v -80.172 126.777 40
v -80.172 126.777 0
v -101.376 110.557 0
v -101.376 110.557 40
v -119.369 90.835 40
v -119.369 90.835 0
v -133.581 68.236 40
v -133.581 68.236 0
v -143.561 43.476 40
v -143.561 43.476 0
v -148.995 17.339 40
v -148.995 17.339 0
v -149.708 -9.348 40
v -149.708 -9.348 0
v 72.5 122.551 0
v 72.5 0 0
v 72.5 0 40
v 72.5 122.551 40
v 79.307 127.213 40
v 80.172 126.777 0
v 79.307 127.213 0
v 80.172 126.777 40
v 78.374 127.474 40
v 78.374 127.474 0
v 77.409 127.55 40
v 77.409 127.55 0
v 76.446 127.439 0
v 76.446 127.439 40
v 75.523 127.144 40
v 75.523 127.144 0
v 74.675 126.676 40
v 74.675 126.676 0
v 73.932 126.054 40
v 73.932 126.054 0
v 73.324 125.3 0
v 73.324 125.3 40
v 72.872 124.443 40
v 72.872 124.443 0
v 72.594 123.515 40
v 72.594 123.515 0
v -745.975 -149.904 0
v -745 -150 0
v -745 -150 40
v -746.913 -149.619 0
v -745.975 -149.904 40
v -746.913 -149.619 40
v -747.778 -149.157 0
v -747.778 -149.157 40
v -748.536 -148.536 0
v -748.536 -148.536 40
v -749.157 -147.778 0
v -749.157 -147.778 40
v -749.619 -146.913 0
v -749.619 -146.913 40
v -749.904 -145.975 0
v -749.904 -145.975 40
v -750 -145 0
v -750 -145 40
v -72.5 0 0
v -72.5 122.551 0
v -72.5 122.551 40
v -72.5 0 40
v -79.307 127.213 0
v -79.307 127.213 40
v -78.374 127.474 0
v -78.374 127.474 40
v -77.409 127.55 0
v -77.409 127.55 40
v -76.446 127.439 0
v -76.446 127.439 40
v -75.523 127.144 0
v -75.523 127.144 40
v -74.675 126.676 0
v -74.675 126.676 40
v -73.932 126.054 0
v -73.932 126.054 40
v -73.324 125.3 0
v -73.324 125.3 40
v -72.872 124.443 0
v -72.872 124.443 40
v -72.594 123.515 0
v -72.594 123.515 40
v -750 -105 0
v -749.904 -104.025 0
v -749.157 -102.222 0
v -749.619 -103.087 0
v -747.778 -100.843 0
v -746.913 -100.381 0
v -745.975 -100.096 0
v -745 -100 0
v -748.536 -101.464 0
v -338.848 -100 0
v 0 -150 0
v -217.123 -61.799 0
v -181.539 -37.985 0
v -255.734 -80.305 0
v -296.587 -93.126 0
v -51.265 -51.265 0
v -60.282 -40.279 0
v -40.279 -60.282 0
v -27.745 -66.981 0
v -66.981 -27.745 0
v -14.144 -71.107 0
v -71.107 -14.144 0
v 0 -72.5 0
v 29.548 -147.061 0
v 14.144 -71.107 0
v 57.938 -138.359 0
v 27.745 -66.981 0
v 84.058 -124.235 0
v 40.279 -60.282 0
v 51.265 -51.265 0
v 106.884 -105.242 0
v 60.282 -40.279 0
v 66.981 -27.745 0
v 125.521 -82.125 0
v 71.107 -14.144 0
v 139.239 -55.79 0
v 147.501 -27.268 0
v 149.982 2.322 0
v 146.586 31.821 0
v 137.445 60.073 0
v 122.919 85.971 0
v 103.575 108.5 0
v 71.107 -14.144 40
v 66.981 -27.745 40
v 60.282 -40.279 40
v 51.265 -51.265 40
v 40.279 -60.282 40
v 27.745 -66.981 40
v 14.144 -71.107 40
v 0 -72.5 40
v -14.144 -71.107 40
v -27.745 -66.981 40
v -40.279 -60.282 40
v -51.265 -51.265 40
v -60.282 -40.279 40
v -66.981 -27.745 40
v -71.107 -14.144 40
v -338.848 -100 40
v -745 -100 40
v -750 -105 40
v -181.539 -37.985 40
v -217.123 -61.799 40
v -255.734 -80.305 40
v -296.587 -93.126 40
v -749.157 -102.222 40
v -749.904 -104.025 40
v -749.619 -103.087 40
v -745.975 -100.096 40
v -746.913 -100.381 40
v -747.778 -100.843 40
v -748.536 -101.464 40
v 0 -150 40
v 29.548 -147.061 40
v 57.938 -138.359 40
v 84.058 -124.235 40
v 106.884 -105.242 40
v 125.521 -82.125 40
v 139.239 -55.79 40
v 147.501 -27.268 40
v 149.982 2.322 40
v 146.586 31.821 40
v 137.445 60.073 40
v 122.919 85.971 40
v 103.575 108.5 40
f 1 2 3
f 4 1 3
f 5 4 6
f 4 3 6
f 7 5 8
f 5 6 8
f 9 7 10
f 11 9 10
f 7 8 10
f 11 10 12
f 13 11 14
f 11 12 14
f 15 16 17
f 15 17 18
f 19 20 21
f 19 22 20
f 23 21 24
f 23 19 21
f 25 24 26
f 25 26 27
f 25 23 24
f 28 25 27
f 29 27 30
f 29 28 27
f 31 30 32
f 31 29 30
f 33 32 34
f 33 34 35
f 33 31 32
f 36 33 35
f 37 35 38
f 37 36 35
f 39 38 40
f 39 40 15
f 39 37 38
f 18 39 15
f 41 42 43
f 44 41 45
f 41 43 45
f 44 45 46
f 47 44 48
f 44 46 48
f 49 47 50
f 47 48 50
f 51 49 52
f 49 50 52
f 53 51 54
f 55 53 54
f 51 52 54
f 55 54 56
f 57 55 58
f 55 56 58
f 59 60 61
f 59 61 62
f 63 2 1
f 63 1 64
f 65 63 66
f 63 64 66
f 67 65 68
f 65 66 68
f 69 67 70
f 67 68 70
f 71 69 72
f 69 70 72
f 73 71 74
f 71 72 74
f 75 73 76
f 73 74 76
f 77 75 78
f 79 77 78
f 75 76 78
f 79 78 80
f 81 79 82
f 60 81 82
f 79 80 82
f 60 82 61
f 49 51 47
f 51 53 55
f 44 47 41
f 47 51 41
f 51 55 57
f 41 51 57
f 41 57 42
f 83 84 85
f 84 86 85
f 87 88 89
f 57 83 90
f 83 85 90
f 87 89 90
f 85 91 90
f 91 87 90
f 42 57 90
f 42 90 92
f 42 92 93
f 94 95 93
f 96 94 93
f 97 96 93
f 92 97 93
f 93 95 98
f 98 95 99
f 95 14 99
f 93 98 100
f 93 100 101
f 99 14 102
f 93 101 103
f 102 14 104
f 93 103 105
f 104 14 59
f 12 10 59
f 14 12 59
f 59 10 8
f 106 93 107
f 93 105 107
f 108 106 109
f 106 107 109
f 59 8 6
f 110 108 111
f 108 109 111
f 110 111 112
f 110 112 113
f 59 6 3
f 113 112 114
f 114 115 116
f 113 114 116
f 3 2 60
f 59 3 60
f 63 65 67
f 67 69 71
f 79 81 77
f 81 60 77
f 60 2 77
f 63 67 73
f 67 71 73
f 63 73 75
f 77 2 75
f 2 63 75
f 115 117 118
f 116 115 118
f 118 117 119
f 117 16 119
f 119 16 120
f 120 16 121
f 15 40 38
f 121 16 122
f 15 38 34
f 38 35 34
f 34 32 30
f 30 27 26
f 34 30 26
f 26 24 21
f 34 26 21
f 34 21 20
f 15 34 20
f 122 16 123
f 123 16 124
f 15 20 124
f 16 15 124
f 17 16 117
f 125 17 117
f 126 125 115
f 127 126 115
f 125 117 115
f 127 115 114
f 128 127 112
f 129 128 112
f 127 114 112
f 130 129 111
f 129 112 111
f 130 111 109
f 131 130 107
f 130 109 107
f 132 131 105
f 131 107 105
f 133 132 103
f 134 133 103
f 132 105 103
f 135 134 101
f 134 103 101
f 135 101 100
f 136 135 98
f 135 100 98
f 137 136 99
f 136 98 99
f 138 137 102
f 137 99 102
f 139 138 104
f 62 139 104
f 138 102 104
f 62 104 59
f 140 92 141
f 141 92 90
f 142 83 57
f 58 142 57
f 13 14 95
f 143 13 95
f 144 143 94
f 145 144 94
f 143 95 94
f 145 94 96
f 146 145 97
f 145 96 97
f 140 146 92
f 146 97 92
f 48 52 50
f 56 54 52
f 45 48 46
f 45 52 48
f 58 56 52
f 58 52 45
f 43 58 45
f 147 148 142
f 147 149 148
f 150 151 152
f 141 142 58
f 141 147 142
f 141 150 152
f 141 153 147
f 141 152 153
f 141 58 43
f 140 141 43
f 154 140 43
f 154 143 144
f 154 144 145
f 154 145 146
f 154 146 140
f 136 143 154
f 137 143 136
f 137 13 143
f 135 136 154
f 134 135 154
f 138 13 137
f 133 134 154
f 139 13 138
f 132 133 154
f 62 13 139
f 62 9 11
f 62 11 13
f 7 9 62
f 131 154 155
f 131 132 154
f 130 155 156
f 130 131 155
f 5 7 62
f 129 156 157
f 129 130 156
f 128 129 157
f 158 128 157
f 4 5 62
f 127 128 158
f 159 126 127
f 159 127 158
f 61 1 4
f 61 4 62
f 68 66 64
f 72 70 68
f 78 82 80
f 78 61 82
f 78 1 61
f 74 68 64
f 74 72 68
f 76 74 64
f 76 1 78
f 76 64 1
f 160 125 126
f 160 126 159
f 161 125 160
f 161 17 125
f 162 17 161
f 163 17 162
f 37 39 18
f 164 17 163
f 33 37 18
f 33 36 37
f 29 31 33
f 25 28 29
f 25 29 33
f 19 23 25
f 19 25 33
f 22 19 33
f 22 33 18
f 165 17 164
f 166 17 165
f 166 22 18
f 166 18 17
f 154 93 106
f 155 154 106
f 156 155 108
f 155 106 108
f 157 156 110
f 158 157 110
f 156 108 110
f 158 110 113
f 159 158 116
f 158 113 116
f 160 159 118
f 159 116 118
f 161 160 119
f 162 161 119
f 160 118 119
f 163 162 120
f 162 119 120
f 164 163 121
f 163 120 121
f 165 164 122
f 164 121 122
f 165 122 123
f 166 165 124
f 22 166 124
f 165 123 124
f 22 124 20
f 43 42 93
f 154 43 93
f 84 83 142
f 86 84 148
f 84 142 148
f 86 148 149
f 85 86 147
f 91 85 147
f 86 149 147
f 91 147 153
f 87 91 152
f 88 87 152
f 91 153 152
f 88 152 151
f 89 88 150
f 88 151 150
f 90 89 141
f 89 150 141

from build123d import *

# Parameters (mm, degrees)
F1_DEPTH = 40
F2_DEPTH = 40
F3_R     = 5


with BuildPart() as f1:
    # F0 (on Top) → F1 (new body)
    with BuildSketch(Plane.XY):
        with BuildLine():
            Line((72.5, 131.3154598667), (72.5, 0))
            ThreePointArc((72.5, 0), (0, -72.5), (-72.5, 0))
            Line((-72.5, 0), (-72.5, 131.3154598667))
            ThreePointArc((-72.5, 131.3154598667), (-131.4940701743, 72.1755464751), (-149.7084414814, -9.3478633504))
            ThreePointArc((-149.7084414814, -9.3478633504), (-138.3891727392, -57.8656795395), (-111.803398875, -100))
            Line((-111.803398875, -100), (0, -100))
            Line((0, -100), (0, -150))
            ThreePointArc((0, -150), (106.066017178, -106.066017178), (150, 0))
            ThreePointArc((150, 0), (129.1801068276, 76.2397534099), (72.5, 131.3154598667))
        make_face()
        with BuildLine():
            ThreePointArc((-72.5, 0), (0, 72.5), (72.5, 0))
            Line((72.5, 0), (72.5, 131.3154598667))
            ThreePointArc((72.5, 131.3154598667), (0, 150), (-72.5, 131.3154598667))
            Line((-72.5, 131.3154598667), (-72.5, 0))
        make_face()
        with BuildLine():
            ThreePointArc((-111.803398875, -100), (-138.3891727392, -57.8656795395), (-149.7084414814, -9.3478633504))
            ThreePointArc((-149.7084414814, -9.3478633504), (-236.0979616676, -71.7417201282), (-338.8482034206, -100))
            Line((-338.8482034206, -100), (-111.803398875, -100))
        make_face()
        with BuildLine():
            Line((-750, -150), (0, -150))
            ThreePointArc((0, -150), (-61.2372435696, -136.9306393763), (-111.803398875, -100))
            Line((-111.803398875, -100), (-338.8482034206, -100))
            Line((-338.8482034206, -100), (-750, -100))
            Line((-750, -100), (-750, -150))
        make_face()
        with BuildLine():
            ThreePointArc((-111.803398875, -100), (-61.2372435696, -136.9306393763), (0, -150))
            Line((0, -150), (0, -100))
            Line((0, -100), (-111.803398875, -100))
        make_face()
    extrude(amount=F1_DEPTH)

    # F0 (on Top) → F2 (cut)
    with BuildSketch(Plane.XY):
        with BuildLine():
            ThreePointArc((-72.5, 0), (0, 72.5), (72.5, 0))
            Line((72.5, 0), (72.5, 131.3154598667))
            ThreePointArc((72.5, 131.3154598667), (0, 150), (-72.5, 131.3154598667))
            Line((-72.5, 131.3154598667), (-72.5, 0))
        make_face()
    extrude(amount=F2_DEPTH, mode=Mode.SUBTRACT)

    # F3
    f3_edges = [f1.edges().sort_by_distance(p)[0] for p in [
        (-750, -150, 20),
        (-72.5, 131.31546, 20),
        (72.5, 131.31546, 20),
        (-750, -100, 20),
    ]]
    fillet(f3_edges, radius=F3_R)


solid = f1.part
